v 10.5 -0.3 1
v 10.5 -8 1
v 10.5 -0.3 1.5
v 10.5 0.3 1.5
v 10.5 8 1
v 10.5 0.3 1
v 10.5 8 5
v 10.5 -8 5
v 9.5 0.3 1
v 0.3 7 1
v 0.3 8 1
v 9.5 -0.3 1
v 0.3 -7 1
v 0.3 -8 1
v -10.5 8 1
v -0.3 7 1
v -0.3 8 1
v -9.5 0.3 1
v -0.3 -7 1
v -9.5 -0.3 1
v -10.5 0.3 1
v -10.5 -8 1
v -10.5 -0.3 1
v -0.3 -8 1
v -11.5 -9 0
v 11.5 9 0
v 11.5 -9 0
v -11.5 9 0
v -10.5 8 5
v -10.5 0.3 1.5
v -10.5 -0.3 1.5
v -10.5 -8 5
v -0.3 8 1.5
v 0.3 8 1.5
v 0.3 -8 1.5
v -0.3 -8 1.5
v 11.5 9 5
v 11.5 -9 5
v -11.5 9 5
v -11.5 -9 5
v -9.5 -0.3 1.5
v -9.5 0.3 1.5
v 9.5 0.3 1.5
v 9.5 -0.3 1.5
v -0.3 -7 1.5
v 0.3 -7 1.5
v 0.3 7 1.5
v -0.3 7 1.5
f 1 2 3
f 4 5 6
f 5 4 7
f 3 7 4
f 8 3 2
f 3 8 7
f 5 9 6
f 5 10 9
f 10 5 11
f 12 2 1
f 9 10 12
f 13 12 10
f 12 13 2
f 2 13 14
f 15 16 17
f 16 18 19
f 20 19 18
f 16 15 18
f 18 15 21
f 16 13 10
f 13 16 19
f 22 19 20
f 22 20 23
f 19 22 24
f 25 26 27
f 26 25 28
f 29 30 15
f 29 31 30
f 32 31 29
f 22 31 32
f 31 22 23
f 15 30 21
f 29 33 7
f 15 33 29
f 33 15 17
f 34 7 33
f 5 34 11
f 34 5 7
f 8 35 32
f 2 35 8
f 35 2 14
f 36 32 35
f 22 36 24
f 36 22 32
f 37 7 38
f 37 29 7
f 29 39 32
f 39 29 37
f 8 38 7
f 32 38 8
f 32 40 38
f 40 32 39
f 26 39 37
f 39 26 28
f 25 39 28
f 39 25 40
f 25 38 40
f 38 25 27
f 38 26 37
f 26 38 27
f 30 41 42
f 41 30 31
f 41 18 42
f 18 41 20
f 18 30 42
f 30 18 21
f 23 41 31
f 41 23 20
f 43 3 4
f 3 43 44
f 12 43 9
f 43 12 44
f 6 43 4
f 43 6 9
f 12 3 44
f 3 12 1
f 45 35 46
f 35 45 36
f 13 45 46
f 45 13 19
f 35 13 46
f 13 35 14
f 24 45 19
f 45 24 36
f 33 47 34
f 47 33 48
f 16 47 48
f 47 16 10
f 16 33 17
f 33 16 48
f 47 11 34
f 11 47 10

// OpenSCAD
l = 20;
w =15;
t = 3;
eps = 0.01;
gap = 0.5;
lt = 1;
pegW = w/25;
lidH = 5;

module lid(){
    translate([0,0,lt/2]) 
        cube([l+gap*2, w+gap*2, lt],center=true);
    
    linear_extrude(lidH)
        difference(){
            square([l+gap*2+lt*2, w+gap*2+lt*2], center=true);
            square([l+gap*2, w+gap*2], center=true);
        }
    
    mirror([1,0,0]) translate([l/2,0,gap/2+lt]) 
        cube([gap*2,pegW,gap], center=true);
        
    translate([l/2,0,gap/2+lt]) 
        cube([gap*2,pegW,gap], center=true);
        
    mirror([0,1,0]) translate([0,w/2,gap/2+lt]) rotate([0,0,90])
        cube([gap*2,pegW,gap], center=true);
        
    translate([0,w/2,gap/2+lt]) rotate([0,0,90])
        cube([gap*2,pegW,gap], center=true);
}

lid();
